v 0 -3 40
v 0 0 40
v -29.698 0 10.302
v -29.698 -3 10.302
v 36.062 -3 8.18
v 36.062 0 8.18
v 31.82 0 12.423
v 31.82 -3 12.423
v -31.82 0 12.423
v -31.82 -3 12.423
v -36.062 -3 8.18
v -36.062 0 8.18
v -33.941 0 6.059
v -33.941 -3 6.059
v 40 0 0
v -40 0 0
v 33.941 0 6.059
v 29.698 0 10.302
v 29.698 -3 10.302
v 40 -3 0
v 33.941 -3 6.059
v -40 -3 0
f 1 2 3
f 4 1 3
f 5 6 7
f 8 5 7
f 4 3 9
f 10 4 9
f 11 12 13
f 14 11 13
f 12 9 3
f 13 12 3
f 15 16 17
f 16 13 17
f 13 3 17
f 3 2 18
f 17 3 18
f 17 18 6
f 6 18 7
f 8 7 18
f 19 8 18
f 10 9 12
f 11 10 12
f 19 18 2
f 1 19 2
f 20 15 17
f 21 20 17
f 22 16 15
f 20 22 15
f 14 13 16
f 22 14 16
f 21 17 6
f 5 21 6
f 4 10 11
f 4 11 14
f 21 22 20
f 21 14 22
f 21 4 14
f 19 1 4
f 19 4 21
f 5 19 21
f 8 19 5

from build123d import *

# Parameters (mm, degrees)
F2_DEPTH = 3


with BuildPart() as f2:
    # F1 (on Front) → F2 (new body)
    with BuildSketch(Plane.XZ):
        Polygon((-33.941125497, 6.058874503), (-40, 0), (40, 0), (33.941125497, 6.058874503), (29.6984848098, 10.3015151902), (0, 40), (-29.6984848098, 10.3015151902), align=None)
        Polygon((29.6984848098, 10.3015151902), (33.941125497, 6.058874503), (36.0624458405, 8.1801948466), (31.8198051534, 12.4228355337), align=None)
        Polygon((-36.0624458405, 8.1801948466), (-33.941125497, 6.058874503), (-29.6984848098, 10.3015151902), (-31.8198051534, 12.4228355337), align=None)
    extrude(amount=F2_DEPTH)


solid = f2.part
